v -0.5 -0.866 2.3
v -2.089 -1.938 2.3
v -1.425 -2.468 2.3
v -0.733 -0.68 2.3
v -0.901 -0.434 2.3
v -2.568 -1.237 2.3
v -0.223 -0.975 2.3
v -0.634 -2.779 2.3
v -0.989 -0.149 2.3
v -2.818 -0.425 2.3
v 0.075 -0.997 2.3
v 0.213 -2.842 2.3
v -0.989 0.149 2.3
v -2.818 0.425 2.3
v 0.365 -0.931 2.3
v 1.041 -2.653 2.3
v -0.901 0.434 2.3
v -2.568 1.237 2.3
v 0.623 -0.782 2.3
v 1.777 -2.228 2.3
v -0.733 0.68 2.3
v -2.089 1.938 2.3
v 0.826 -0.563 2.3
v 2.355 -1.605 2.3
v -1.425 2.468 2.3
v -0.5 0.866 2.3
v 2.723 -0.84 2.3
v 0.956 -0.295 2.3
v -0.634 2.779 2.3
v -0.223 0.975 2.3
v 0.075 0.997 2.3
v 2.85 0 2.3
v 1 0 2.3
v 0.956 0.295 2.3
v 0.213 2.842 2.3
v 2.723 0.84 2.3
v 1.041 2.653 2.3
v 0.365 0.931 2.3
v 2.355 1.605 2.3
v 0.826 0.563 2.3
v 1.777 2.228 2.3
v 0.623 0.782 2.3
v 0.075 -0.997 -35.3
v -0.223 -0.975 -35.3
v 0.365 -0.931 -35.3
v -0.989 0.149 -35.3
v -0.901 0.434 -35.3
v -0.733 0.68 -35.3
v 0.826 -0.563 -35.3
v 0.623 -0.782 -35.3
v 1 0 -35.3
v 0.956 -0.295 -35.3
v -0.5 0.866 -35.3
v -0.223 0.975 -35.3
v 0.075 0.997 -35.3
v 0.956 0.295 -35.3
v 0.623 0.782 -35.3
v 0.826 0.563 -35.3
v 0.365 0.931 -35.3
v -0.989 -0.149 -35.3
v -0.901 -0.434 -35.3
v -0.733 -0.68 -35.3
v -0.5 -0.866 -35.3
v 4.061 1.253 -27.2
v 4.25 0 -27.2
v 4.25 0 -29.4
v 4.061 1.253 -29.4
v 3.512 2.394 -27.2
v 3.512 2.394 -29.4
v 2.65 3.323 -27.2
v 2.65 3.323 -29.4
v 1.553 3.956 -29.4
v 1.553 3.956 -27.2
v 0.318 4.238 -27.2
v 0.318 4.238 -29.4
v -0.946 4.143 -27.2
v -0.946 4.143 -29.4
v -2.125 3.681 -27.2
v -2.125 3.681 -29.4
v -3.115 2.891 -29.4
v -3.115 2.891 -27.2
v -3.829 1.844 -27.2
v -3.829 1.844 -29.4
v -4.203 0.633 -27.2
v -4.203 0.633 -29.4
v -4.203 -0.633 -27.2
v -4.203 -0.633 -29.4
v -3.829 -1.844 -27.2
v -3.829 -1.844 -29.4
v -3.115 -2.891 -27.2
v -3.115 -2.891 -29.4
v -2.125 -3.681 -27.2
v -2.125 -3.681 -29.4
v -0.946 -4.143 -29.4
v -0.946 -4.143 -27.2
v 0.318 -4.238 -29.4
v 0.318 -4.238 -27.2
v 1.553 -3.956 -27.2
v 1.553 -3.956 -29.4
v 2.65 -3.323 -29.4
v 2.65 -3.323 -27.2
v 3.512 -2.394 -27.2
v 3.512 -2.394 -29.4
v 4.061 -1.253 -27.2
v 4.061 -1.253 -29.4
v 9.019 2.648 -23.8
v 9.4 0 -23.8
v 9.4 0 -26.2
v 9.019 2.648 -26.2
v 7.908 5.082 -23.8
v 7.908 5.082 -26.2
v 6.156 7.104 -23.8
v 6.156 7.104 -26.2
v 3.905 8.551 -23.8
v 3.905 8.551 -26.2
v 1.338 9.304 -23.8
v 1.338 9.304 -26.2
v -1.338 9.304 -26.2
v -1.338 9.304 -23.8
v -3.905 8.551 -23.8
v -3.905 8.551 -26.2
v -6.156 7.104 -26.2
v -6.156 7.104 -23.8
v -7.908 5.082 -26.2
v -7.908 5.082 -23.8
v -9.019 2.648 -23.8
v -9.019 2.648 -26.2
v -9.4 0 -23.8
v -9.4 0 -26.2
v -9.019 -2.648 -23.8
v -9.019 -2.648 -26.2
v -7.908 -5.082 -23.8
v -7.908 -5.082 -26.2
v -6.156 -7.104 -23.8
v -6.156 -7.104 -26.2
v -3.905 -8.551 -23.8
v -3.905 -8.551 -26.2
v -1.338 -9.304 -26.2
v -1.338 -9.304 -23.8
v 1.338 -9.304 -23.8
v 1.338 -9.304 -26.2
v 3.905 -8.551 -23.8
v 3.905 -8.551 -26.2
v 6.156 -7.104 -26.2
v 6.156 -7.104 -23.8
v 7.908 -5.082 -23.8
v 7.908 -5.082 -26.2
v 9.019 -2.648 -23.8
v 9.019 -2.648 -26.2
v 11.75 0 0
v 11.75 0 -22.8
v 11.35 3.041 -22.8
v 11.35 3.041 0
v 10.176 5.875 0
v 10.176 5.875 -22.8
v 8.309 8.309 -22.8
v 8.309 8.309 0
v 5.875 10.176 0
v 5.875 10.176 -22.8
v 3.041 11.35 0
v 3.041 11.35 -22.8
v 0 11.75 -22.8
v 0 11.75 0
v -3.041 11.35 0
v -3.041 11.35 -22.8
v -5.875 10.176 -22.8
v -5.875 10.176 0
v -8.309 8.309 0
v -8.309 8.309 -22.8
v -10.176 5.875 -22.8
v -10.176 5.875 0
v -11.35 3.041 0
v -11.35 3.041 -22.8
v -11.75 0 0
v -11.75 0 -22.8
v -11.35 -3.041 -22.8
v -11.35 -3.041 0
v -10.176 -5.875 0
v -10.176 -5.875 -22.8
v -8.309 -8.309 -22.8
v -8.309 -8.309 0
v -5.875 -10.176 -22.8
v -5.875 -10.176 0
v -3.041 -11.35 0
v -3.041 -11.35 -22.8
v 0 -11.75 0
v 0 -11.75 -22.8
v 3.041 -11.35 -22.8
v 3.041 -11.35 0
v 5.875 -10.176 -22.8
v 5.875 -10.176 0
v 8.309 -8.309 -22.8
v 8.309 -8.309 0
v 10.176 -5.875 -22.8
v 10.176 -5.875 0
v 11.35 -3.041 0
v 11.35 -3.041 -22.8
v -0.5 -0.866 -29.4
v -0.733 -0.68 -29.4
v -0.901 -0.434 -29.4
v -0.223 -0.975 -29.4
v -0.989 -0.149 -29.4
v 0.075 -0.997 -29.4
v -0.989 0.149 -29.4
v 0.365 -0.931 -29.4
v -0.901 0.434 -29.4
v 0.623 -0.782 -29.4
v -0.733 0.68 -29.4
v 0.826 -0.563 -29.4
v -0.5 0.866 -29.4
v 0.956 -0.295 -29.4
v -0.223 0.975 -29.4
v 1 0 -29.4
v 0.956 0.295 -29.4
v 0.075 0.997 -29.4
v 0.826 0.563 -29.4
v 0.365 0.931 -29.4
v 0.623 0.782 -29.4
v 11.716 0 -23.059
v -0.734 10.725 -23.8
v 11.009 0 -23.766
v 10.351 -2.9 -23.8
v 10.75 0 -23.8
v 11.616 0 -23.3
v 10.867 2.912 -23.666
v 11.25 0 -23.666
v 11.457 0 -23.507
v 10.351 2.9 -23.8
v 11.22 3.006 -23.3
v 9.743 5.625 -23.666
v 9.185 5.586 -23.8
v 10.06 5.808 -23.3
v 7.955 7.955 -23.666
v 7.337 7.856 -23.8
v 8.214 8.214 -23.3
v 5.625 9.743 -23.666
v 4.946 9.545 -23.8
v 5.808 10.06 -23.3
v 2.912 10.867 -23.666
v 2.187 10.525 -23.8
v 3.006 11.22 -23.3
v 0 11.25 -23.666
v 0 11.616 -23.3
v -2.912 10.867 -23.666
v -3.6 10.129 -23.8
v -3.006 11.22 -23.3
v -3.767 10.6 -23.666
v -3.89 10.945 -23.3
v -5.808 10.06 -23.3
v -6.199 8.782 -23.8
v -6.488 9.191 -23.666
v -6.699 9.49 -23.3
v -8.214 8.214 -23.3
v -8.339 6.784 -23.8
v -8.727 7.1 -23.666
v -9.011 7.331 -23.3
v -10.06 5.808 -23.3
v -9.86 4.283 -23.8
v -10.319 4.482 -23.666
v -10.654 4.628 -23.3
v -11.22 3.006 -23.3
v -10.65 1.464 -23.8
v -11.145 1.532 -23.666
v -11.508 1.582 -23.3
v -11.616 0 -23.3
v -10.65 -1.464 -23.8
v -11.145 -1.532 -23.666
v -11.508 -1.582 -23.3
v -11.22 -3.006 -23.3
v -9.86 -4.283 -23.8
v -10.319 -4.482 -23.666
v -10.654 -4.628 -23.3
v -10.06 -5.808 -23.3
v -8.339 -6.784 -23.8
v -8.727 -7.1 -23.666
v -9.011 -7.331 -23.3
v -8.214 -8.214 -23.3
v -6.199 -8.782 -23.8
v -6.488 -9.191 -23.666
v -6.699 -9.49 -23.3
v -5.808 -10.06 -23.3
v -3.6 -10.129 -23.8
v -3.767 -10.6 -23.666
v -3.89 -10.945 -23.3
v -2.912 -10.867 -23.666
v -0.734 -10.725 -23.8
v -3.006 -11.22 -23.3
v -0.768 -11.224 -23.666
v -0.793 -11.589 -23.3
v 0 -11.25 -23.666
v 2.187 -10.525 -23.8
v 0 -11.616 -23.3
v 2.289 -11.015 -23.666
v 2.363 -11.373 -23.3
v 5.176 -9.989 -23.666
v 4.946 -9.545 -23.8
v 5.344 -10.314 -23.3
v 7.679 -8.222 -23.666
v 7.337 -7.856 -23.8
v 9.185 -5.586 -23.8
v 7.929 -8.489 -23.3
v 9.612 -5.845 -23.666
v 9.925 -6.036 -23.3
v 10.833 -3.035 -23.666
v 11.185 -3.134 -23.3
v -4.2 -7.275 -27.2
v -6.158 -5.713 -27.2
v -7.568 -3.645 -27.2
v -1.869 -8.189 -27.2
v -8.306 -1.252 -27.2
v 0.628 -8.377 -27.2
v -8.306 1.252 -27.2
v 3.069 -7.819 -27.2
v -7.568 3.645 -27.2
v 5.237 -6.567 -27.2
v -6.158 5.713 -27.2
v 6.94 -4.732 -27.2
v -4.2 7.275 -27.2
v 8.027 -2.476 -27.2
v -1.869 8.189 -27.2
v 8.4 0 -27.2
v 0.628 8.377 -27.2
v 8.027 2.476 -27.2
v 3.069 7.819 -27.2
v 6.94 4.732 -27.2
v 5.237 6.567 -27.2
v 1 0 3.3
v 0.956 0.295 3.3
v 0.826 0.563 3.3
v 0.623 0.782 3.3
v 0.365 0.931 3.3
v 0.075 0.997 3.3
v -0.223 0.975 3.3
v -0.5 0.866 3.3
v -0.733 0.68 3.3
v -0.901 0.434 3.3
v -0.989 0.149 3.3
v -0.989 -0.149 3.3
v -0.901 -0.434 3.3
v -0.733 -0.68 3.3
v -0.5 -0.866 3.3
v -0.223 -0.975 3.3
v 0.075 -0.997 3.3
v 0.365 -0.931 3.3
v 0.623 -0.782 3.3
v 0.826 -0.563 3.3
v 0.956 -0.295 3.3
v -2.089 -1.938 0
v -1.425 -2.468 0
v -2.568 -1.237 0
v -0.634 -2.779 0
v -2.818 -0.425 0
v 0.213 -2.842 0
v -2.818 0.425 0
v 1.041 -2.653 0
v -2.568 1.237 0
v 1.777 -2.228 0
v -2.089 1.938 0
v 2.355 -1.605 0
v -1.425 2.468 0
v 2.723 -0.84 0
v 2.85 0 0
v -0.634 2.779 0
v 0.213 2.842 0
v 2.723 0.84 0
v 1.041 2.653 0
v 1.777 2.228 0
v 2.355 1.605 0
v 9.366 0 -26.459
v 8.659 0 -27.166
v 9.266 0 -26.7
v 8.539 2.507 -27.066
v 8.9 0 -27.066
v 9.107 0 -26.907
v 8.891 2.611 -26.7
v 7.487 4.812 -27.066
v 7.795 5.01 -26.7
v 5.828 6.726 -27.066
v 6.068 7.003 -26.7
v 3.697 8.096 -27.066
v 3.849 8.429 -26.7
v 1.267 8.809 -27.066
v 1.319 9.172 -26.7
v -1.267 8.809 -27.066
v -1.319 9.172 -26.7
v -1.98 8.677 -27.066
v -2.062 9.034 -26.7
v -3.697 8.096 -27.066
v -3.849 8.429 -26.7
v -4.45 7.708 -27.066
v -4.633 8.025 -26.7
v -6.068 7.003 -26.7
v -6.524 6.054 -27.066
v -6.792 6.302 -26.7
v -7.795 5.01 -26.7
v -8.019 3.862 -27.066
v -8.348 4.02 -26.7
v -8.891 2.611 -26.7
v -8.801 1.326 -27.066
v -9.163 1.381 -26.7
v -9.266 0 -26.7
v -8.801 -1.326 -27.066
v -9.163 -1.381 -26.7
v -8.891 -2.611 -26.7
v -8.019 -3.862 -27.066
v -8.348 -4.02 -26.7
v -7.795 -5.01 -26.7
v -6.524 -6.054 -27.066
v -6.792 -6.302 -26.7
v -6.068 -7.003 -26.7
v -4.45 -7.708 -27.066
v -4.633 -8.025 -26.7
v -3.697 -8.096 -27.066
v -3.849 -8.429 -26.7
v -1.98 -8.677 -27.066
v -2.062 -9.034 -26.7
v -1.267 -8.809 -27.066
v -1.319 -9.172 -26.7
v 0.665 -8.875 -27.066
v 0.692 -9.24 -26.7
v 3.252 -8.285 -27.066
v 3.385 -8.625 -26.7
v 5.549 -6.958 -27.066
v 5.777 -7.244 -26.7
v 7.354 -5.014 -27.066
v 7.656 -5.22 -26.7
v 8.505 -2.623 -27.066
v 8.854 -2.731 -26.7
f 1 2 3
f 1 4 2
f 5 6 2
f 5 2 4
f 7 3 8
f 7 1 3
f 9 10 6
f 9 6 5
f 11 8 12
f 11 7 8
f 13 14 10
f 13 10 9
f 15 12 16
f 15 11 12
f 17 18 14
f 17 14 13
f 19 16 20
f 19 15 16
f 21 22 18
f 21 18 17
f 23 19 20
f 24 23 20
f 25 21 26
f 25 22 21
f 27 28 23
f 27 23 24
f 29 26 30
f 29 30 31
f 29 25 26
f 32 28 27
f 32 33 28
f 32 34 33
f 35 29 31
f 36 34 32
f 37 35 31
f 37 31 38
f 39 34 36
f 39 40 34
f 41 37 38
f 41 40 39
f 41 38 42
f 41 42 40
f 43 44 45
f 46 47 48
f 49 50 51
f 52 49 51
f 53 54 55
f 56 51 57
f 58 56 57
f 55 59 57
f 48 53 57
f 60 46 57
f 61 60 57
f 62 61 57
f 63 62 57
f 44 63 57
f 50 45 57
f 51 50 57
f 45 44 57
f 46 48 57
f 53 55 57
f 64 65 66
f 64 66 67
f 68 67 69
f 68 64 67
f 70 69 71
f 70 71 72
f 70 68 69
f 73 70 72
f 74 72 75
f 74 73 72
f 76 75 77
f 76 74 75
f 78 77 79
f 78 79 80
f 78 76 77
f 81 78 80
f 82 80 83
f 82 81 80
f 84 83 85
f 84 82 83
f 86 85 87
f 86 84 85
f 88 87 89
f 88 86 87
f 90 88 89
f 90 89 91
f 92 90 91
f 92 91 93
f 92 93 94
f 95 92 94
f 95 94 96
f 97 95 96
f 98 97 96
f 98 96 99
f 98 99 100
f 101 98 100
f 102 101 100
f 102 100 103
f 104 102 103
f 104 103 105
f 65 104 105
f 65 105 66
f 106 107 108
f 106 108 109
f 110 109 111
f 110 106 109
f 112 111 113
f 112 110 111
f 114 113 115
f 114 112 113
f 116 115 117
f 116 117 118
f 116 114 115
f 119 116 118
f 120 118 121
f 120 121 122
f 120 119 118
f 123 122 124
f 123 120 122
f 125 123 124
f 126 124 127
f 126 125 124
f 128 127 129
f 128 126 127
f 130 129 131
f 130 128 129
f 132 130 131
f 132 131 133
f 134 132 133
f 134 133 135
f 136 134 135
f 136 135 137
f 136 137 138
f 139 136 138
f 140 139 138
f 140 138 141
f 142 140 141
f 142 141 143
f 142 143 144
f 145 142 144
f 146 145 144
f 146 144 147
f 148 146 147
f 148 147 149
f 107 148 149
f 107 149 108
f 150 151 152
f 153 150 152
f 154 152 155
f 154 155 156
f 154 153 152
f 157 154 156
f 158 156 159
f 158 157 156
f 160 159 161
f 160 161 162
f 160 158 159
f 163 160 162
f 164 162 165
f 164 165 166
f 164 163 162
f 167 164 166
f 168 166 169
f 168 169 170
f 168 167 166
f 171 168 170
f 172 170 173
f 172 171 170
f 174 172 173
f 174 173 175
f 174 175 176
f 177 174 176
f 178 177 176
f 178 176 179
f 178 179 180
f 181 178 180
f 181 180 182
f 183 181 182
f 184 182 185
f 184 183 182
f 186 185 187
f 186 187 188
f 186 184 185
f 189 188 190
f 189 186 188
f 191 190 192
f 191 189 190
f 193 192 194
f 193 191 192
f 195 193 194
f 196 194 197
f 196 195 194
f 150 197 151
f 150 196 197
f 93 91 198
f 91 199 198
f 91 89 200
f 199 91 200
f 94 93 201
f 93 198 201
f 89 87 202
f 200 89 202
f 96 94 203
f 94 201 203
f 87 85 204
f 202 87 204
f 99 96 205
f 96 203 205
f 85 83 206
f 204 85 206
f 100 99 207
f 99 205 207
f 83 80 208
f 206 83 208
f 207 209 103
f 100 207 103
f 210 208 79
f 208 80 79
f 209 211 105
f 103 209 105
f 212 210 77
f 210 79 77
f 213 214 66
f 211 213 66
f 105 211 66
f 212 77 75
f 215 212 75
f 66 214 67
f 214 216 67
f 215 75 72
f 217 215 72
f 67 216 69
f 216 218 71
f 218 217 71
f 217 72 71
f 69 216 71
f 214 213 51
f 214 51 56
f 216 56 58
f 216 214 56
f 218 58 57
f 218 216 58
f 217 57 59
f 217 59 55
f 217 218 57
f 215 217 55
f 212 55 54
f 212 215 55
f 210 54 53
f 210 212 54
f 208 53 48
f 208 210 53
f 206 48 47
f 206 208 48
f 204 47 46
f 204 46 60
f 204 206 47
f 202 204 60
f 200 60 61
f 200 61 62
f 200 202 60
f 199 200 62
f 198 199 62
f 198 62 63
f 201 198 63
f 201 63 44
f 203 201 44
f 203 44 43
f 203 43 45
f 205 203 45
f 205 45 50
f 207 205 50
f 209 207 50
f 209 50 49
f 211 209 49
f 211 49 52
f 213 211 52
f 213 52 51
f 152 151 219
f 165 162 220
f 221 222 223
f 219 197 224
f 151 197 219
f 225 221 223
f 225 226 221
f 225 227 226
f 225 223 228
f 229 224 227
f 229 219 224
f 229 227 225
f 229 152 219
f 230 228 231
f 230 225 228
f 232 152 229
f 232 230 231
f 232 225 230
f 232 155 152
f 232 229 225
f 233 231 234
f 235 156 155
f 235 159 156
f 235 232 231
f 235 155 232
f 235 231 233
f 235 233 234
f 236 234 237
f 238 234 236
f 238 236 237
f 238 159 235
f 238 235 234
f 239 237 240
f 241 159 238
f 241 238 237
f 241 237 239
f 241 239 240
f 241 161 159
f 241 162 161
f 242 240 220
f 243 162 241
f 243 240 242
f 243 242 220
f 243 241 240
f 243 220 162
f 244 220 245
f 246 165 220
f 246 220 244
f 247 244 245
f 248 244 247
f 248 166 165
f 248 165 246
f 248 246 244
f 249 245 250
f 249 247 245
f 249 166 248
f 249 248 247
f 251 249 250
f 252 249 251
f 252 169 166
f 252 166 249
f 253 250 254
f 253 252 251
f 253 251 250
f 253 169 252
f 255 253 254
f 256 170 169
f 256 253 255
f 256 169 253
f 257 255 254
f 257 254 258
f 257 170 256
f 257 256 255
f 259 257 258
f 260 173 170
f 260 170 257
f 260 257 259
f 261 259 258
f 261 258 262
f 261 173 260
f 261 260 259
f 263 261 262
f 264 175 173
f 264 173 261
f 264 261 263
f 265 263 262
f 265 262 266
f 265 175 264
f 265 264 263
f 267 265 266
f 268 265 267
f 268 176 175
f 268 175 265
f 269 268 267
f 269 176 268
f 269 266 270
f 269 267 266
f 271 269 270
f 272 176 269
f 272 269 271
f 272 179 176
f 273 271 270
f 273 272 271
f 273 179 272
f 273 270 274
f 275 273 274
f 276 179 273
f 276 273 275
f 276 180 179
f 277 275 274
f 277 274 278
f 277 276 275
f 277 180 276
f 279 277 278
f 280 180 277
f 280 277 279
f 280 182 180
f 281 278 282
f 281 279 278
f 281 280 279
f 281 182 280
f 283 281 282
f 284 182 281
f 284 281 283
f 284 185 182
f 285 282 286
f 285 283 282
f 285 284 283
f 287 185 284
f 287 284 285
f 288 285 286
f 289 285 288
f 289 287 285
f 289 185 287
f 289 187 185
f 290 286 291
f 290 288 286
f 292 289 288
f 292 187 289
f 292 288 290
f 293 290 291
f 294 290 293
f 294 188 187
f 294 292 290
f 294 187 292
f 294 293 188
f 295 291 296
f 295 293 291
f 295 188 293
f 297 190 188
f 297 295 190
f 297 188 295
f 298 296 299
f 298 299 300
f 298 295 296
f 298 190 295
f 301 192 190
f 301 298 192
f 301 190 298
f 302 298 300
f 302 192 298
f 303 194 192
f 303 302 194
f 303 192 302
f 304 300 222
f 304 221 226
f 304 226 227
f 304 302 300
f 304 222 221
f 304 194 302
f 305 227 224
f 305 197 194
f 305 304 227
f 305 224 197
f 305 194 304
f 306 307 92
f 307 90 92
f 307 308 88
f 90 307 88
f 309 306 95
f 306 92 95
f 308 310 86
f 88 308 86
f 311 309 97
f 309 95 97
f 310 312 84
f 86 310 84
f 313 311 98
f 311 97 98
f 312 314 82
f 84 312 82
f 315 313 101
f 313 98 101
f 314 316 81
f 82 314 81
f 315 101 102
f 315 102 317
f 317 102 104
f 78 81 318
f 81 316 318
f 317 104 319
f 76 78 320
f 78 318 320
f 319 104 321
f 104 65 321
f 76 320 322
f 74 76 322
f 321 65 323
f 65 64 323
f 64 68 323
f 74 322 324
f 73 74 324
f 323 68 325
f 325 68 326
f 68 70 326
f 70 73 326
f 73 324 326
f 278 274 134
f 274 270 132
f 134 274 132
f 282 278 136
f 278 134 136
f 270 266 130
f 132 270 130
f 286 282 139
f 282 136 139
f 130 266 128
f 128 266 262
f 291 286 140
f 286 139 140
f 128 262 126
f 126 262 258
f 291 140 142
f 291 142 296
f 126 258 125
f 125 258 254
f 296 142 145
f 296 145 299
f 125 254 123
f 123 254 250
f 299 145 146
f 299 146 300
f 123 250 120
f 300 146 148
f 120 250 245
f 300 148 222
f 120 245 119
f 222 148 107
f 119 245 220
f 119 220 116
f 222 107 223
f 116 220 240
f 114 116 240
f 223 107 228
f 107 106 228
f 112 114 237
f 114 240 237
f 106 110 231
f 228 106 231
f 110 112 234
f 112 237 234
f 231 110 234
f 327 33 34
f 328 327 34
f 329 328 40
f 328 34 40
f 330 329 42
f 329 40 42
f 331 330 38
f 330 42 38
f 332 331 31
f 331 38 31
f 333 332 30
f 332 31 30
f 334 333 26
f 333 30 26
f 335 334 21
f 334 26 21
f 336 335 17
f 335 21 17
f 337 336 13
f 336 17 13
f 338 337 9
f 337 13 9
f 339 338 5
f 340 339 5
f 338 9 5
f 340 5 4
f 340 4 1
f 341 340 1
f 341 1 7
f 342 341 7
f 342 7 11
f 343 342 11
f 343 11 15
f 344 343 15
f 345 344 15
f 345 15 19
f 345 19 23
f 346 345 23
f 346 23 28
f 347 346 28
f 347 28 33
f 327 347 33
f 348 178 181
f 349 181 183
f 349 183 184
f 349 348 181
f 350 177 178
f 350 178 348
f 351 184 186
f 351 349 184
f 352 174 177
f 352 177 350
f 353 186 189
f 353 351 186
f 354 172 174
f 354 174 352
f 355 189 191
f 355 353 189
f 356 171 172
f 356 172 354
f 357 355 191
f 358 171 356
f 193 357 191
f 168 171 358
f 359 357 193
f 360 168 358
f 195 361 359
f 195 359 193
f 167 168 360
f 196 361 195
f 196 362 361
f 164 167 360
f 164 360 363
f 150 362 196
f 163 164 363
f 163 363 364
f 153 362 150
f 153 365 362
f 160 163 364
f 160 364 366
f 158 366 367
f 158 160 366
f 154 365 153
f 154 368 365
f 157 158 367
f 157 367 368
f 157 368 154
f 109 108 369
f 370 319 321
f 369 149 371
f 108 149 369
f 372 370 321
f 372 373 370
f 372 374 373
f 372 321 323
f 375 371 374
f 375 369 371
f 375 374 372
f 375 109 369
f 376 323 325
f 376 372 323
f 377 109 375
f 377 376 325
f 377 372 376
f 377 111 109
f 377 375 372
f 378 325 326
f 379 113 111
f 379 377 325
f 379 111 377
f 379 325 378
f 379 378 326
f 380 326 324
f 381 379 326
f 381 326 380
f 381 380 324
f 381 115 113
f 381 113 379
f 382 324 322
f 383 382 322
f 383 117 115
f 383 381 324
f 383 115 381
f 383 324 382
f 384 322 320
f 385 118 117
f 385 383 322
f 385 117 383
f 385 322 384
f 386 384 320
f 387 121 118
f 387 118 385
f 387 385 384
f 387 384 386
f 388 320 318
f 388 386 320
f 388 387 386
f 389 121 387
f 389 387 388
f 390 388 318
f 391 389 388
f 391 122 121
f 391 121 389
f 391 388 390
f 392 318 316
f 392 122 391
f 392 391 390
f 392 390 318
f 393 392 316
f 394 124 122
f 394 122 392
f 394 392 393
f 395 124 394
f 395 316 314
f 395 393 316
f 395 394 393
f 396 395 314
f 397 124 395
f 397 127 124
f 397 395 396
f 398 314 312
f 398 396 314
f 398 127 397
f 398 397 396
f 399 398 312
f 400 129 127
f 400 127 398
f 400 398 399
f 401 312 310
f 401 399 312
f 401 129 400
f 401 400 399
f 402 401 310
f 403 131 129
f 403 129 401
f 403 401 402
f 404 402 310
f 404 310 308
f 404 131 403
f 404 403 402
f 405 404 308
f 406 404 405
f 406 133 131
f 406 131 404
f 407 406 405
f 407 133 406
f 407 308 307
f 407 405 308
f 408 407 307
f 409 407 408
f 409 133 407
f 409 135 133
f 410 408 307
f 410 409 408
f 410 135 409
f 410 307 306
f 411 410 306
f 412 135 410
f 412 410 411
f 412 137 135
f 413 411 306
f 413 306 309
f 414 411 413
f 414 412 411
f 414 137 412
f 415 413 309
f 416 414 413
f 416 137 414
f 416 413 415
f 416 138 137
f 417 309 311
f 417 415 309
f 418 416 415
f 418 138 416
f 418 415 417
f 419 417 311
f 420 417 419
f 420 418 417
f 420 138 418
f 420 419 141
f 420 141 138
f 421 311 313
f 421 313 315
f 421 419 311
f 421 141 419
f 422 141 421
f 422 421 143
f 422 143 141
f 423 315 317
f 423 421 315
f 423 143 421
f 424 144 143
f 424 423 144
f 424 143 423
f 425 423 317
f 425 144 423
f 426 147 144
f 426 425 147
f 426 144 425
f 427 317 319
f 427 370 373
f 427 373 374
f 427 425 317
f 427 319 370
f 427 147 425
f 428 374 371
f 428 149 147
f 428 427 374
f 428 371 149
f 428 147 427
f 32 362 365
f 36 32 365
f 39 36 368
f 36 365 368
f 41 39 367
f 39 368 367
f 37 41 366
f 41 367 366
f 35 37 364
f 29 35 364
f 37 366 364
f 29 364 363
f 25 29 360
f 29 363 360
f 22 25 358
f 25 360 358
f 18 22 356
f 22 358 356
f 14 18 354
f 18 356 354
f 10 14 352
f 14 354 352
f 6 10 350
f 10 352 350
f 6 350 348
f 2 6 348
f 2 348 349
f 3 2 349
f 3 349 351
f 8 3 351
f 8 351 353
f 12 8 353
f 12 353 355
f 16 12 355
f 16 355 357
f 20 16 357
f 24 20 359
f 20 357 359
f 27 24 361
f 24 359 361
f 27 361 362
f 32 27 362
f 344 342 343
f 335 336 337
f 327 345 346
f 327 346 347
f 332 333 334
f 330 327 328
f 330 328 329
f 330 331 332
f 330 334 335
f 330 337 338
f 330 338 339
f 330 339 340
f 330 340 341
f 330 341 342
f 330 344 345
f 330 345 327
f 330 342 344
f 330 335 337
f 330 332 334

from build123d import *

# Parameters (mm, degrees)
SKETCH1_R                = 11.75
SKETCH1_R_2              = 9.4
BOSS_EXTRUDE1_DEPTH      = 23.8
SKETCH1_3_R              = 9.4
SKETCH1_3_R_2            = 4.25
BOSS_EXTRUDE2_DEPTH      = 27.2
SKETCH1_4_R              = 4.25
SKETCH1_4_R_2            = 2.85
BOSS_EXTRUDE3_DEPTH      = 29.4
BOSS_EXTRUDE4_DEPTH      = 2.3
BOSS_EXTRUDE4_DEPTH_BACK = 29.4
SKETCH1_5_R              = 2.85
BOSS_EXTRUDE5_DEPTH      = 3.3
BOSS_EXTRUDE5_DEPTH_BACK = 35.3
SKETCH1_6_R              = 1
FILLET1_R                = 1


with BuildPart() as part:
    # Sketch1 → Boss-Extrude1 (new body)
    with BuildSketch(Plane.XY):
        Circle(SKETCH1_R)
        Circle(SKETCH1_R_2, mode=Mode.SUBTRACT)
    extrude(amount=-BOSS_EXTRUDE1_DEPTH)

    # Sketch1<3> → Boss-Extrude2 (add)
    with BuildSketch(Plane.XY):
        Circle(SKETCH1_3_R)
        Circle(SKETCH1_3_R_2, mode=Mode.SUBTRACT)
    extrude(amount=-BOSS_EXTRUDE2_DEPTH)

    # Sketch1<4> → Boss-Extrude3 (add)
    with BuildSketch(Plane.XY):
        Circle(SKETCH1_4_R)
        Circle(SKETCH1_4_R_2, mode=Mode.SUBTRACT)
    extrude(amount=-BOSS_EXTRUDE3_DEPTH)

    # Sketch1<5> → Boss-Extrude4 (add, two sides: drawn at the far end of the back side and taken through both)
    with BuildSketch(Plane.XY.offset(-BOSS_EXTRUDE4_DEPTH_BACK)):
        Circle(SKETCH1_5_R)
    extrude(amount=BOSS_EXTRUDE4_DEPTH + BOSS_EXTRUDE4_DEPTH_BACK)

    # Sketch1<6> → Boss-Extrude5 (add, two sides: drawn at the far end of the back side and taken through both)
    with BuildSketch(Plane.XY.offset(-BOSS_EXTRUDE5_DEPTH_BACK)):
        Circle(SKETCH1_6_R)
    extrude(amount=BOSS_EXTRUDE5_DEPTH + BOSS_EXTRUDE5_DEPTH_BACK)

    # Fillet1
    fillet1_edges = [part.edges().sort_by_distance(p)[0] for p in [
        (-9.4, 0, -27.2),
        (-11.75, 0, -23.8),
    ]]
    fillet(fillet1_edges, radius=FILLET1_R)


solid = part.part
